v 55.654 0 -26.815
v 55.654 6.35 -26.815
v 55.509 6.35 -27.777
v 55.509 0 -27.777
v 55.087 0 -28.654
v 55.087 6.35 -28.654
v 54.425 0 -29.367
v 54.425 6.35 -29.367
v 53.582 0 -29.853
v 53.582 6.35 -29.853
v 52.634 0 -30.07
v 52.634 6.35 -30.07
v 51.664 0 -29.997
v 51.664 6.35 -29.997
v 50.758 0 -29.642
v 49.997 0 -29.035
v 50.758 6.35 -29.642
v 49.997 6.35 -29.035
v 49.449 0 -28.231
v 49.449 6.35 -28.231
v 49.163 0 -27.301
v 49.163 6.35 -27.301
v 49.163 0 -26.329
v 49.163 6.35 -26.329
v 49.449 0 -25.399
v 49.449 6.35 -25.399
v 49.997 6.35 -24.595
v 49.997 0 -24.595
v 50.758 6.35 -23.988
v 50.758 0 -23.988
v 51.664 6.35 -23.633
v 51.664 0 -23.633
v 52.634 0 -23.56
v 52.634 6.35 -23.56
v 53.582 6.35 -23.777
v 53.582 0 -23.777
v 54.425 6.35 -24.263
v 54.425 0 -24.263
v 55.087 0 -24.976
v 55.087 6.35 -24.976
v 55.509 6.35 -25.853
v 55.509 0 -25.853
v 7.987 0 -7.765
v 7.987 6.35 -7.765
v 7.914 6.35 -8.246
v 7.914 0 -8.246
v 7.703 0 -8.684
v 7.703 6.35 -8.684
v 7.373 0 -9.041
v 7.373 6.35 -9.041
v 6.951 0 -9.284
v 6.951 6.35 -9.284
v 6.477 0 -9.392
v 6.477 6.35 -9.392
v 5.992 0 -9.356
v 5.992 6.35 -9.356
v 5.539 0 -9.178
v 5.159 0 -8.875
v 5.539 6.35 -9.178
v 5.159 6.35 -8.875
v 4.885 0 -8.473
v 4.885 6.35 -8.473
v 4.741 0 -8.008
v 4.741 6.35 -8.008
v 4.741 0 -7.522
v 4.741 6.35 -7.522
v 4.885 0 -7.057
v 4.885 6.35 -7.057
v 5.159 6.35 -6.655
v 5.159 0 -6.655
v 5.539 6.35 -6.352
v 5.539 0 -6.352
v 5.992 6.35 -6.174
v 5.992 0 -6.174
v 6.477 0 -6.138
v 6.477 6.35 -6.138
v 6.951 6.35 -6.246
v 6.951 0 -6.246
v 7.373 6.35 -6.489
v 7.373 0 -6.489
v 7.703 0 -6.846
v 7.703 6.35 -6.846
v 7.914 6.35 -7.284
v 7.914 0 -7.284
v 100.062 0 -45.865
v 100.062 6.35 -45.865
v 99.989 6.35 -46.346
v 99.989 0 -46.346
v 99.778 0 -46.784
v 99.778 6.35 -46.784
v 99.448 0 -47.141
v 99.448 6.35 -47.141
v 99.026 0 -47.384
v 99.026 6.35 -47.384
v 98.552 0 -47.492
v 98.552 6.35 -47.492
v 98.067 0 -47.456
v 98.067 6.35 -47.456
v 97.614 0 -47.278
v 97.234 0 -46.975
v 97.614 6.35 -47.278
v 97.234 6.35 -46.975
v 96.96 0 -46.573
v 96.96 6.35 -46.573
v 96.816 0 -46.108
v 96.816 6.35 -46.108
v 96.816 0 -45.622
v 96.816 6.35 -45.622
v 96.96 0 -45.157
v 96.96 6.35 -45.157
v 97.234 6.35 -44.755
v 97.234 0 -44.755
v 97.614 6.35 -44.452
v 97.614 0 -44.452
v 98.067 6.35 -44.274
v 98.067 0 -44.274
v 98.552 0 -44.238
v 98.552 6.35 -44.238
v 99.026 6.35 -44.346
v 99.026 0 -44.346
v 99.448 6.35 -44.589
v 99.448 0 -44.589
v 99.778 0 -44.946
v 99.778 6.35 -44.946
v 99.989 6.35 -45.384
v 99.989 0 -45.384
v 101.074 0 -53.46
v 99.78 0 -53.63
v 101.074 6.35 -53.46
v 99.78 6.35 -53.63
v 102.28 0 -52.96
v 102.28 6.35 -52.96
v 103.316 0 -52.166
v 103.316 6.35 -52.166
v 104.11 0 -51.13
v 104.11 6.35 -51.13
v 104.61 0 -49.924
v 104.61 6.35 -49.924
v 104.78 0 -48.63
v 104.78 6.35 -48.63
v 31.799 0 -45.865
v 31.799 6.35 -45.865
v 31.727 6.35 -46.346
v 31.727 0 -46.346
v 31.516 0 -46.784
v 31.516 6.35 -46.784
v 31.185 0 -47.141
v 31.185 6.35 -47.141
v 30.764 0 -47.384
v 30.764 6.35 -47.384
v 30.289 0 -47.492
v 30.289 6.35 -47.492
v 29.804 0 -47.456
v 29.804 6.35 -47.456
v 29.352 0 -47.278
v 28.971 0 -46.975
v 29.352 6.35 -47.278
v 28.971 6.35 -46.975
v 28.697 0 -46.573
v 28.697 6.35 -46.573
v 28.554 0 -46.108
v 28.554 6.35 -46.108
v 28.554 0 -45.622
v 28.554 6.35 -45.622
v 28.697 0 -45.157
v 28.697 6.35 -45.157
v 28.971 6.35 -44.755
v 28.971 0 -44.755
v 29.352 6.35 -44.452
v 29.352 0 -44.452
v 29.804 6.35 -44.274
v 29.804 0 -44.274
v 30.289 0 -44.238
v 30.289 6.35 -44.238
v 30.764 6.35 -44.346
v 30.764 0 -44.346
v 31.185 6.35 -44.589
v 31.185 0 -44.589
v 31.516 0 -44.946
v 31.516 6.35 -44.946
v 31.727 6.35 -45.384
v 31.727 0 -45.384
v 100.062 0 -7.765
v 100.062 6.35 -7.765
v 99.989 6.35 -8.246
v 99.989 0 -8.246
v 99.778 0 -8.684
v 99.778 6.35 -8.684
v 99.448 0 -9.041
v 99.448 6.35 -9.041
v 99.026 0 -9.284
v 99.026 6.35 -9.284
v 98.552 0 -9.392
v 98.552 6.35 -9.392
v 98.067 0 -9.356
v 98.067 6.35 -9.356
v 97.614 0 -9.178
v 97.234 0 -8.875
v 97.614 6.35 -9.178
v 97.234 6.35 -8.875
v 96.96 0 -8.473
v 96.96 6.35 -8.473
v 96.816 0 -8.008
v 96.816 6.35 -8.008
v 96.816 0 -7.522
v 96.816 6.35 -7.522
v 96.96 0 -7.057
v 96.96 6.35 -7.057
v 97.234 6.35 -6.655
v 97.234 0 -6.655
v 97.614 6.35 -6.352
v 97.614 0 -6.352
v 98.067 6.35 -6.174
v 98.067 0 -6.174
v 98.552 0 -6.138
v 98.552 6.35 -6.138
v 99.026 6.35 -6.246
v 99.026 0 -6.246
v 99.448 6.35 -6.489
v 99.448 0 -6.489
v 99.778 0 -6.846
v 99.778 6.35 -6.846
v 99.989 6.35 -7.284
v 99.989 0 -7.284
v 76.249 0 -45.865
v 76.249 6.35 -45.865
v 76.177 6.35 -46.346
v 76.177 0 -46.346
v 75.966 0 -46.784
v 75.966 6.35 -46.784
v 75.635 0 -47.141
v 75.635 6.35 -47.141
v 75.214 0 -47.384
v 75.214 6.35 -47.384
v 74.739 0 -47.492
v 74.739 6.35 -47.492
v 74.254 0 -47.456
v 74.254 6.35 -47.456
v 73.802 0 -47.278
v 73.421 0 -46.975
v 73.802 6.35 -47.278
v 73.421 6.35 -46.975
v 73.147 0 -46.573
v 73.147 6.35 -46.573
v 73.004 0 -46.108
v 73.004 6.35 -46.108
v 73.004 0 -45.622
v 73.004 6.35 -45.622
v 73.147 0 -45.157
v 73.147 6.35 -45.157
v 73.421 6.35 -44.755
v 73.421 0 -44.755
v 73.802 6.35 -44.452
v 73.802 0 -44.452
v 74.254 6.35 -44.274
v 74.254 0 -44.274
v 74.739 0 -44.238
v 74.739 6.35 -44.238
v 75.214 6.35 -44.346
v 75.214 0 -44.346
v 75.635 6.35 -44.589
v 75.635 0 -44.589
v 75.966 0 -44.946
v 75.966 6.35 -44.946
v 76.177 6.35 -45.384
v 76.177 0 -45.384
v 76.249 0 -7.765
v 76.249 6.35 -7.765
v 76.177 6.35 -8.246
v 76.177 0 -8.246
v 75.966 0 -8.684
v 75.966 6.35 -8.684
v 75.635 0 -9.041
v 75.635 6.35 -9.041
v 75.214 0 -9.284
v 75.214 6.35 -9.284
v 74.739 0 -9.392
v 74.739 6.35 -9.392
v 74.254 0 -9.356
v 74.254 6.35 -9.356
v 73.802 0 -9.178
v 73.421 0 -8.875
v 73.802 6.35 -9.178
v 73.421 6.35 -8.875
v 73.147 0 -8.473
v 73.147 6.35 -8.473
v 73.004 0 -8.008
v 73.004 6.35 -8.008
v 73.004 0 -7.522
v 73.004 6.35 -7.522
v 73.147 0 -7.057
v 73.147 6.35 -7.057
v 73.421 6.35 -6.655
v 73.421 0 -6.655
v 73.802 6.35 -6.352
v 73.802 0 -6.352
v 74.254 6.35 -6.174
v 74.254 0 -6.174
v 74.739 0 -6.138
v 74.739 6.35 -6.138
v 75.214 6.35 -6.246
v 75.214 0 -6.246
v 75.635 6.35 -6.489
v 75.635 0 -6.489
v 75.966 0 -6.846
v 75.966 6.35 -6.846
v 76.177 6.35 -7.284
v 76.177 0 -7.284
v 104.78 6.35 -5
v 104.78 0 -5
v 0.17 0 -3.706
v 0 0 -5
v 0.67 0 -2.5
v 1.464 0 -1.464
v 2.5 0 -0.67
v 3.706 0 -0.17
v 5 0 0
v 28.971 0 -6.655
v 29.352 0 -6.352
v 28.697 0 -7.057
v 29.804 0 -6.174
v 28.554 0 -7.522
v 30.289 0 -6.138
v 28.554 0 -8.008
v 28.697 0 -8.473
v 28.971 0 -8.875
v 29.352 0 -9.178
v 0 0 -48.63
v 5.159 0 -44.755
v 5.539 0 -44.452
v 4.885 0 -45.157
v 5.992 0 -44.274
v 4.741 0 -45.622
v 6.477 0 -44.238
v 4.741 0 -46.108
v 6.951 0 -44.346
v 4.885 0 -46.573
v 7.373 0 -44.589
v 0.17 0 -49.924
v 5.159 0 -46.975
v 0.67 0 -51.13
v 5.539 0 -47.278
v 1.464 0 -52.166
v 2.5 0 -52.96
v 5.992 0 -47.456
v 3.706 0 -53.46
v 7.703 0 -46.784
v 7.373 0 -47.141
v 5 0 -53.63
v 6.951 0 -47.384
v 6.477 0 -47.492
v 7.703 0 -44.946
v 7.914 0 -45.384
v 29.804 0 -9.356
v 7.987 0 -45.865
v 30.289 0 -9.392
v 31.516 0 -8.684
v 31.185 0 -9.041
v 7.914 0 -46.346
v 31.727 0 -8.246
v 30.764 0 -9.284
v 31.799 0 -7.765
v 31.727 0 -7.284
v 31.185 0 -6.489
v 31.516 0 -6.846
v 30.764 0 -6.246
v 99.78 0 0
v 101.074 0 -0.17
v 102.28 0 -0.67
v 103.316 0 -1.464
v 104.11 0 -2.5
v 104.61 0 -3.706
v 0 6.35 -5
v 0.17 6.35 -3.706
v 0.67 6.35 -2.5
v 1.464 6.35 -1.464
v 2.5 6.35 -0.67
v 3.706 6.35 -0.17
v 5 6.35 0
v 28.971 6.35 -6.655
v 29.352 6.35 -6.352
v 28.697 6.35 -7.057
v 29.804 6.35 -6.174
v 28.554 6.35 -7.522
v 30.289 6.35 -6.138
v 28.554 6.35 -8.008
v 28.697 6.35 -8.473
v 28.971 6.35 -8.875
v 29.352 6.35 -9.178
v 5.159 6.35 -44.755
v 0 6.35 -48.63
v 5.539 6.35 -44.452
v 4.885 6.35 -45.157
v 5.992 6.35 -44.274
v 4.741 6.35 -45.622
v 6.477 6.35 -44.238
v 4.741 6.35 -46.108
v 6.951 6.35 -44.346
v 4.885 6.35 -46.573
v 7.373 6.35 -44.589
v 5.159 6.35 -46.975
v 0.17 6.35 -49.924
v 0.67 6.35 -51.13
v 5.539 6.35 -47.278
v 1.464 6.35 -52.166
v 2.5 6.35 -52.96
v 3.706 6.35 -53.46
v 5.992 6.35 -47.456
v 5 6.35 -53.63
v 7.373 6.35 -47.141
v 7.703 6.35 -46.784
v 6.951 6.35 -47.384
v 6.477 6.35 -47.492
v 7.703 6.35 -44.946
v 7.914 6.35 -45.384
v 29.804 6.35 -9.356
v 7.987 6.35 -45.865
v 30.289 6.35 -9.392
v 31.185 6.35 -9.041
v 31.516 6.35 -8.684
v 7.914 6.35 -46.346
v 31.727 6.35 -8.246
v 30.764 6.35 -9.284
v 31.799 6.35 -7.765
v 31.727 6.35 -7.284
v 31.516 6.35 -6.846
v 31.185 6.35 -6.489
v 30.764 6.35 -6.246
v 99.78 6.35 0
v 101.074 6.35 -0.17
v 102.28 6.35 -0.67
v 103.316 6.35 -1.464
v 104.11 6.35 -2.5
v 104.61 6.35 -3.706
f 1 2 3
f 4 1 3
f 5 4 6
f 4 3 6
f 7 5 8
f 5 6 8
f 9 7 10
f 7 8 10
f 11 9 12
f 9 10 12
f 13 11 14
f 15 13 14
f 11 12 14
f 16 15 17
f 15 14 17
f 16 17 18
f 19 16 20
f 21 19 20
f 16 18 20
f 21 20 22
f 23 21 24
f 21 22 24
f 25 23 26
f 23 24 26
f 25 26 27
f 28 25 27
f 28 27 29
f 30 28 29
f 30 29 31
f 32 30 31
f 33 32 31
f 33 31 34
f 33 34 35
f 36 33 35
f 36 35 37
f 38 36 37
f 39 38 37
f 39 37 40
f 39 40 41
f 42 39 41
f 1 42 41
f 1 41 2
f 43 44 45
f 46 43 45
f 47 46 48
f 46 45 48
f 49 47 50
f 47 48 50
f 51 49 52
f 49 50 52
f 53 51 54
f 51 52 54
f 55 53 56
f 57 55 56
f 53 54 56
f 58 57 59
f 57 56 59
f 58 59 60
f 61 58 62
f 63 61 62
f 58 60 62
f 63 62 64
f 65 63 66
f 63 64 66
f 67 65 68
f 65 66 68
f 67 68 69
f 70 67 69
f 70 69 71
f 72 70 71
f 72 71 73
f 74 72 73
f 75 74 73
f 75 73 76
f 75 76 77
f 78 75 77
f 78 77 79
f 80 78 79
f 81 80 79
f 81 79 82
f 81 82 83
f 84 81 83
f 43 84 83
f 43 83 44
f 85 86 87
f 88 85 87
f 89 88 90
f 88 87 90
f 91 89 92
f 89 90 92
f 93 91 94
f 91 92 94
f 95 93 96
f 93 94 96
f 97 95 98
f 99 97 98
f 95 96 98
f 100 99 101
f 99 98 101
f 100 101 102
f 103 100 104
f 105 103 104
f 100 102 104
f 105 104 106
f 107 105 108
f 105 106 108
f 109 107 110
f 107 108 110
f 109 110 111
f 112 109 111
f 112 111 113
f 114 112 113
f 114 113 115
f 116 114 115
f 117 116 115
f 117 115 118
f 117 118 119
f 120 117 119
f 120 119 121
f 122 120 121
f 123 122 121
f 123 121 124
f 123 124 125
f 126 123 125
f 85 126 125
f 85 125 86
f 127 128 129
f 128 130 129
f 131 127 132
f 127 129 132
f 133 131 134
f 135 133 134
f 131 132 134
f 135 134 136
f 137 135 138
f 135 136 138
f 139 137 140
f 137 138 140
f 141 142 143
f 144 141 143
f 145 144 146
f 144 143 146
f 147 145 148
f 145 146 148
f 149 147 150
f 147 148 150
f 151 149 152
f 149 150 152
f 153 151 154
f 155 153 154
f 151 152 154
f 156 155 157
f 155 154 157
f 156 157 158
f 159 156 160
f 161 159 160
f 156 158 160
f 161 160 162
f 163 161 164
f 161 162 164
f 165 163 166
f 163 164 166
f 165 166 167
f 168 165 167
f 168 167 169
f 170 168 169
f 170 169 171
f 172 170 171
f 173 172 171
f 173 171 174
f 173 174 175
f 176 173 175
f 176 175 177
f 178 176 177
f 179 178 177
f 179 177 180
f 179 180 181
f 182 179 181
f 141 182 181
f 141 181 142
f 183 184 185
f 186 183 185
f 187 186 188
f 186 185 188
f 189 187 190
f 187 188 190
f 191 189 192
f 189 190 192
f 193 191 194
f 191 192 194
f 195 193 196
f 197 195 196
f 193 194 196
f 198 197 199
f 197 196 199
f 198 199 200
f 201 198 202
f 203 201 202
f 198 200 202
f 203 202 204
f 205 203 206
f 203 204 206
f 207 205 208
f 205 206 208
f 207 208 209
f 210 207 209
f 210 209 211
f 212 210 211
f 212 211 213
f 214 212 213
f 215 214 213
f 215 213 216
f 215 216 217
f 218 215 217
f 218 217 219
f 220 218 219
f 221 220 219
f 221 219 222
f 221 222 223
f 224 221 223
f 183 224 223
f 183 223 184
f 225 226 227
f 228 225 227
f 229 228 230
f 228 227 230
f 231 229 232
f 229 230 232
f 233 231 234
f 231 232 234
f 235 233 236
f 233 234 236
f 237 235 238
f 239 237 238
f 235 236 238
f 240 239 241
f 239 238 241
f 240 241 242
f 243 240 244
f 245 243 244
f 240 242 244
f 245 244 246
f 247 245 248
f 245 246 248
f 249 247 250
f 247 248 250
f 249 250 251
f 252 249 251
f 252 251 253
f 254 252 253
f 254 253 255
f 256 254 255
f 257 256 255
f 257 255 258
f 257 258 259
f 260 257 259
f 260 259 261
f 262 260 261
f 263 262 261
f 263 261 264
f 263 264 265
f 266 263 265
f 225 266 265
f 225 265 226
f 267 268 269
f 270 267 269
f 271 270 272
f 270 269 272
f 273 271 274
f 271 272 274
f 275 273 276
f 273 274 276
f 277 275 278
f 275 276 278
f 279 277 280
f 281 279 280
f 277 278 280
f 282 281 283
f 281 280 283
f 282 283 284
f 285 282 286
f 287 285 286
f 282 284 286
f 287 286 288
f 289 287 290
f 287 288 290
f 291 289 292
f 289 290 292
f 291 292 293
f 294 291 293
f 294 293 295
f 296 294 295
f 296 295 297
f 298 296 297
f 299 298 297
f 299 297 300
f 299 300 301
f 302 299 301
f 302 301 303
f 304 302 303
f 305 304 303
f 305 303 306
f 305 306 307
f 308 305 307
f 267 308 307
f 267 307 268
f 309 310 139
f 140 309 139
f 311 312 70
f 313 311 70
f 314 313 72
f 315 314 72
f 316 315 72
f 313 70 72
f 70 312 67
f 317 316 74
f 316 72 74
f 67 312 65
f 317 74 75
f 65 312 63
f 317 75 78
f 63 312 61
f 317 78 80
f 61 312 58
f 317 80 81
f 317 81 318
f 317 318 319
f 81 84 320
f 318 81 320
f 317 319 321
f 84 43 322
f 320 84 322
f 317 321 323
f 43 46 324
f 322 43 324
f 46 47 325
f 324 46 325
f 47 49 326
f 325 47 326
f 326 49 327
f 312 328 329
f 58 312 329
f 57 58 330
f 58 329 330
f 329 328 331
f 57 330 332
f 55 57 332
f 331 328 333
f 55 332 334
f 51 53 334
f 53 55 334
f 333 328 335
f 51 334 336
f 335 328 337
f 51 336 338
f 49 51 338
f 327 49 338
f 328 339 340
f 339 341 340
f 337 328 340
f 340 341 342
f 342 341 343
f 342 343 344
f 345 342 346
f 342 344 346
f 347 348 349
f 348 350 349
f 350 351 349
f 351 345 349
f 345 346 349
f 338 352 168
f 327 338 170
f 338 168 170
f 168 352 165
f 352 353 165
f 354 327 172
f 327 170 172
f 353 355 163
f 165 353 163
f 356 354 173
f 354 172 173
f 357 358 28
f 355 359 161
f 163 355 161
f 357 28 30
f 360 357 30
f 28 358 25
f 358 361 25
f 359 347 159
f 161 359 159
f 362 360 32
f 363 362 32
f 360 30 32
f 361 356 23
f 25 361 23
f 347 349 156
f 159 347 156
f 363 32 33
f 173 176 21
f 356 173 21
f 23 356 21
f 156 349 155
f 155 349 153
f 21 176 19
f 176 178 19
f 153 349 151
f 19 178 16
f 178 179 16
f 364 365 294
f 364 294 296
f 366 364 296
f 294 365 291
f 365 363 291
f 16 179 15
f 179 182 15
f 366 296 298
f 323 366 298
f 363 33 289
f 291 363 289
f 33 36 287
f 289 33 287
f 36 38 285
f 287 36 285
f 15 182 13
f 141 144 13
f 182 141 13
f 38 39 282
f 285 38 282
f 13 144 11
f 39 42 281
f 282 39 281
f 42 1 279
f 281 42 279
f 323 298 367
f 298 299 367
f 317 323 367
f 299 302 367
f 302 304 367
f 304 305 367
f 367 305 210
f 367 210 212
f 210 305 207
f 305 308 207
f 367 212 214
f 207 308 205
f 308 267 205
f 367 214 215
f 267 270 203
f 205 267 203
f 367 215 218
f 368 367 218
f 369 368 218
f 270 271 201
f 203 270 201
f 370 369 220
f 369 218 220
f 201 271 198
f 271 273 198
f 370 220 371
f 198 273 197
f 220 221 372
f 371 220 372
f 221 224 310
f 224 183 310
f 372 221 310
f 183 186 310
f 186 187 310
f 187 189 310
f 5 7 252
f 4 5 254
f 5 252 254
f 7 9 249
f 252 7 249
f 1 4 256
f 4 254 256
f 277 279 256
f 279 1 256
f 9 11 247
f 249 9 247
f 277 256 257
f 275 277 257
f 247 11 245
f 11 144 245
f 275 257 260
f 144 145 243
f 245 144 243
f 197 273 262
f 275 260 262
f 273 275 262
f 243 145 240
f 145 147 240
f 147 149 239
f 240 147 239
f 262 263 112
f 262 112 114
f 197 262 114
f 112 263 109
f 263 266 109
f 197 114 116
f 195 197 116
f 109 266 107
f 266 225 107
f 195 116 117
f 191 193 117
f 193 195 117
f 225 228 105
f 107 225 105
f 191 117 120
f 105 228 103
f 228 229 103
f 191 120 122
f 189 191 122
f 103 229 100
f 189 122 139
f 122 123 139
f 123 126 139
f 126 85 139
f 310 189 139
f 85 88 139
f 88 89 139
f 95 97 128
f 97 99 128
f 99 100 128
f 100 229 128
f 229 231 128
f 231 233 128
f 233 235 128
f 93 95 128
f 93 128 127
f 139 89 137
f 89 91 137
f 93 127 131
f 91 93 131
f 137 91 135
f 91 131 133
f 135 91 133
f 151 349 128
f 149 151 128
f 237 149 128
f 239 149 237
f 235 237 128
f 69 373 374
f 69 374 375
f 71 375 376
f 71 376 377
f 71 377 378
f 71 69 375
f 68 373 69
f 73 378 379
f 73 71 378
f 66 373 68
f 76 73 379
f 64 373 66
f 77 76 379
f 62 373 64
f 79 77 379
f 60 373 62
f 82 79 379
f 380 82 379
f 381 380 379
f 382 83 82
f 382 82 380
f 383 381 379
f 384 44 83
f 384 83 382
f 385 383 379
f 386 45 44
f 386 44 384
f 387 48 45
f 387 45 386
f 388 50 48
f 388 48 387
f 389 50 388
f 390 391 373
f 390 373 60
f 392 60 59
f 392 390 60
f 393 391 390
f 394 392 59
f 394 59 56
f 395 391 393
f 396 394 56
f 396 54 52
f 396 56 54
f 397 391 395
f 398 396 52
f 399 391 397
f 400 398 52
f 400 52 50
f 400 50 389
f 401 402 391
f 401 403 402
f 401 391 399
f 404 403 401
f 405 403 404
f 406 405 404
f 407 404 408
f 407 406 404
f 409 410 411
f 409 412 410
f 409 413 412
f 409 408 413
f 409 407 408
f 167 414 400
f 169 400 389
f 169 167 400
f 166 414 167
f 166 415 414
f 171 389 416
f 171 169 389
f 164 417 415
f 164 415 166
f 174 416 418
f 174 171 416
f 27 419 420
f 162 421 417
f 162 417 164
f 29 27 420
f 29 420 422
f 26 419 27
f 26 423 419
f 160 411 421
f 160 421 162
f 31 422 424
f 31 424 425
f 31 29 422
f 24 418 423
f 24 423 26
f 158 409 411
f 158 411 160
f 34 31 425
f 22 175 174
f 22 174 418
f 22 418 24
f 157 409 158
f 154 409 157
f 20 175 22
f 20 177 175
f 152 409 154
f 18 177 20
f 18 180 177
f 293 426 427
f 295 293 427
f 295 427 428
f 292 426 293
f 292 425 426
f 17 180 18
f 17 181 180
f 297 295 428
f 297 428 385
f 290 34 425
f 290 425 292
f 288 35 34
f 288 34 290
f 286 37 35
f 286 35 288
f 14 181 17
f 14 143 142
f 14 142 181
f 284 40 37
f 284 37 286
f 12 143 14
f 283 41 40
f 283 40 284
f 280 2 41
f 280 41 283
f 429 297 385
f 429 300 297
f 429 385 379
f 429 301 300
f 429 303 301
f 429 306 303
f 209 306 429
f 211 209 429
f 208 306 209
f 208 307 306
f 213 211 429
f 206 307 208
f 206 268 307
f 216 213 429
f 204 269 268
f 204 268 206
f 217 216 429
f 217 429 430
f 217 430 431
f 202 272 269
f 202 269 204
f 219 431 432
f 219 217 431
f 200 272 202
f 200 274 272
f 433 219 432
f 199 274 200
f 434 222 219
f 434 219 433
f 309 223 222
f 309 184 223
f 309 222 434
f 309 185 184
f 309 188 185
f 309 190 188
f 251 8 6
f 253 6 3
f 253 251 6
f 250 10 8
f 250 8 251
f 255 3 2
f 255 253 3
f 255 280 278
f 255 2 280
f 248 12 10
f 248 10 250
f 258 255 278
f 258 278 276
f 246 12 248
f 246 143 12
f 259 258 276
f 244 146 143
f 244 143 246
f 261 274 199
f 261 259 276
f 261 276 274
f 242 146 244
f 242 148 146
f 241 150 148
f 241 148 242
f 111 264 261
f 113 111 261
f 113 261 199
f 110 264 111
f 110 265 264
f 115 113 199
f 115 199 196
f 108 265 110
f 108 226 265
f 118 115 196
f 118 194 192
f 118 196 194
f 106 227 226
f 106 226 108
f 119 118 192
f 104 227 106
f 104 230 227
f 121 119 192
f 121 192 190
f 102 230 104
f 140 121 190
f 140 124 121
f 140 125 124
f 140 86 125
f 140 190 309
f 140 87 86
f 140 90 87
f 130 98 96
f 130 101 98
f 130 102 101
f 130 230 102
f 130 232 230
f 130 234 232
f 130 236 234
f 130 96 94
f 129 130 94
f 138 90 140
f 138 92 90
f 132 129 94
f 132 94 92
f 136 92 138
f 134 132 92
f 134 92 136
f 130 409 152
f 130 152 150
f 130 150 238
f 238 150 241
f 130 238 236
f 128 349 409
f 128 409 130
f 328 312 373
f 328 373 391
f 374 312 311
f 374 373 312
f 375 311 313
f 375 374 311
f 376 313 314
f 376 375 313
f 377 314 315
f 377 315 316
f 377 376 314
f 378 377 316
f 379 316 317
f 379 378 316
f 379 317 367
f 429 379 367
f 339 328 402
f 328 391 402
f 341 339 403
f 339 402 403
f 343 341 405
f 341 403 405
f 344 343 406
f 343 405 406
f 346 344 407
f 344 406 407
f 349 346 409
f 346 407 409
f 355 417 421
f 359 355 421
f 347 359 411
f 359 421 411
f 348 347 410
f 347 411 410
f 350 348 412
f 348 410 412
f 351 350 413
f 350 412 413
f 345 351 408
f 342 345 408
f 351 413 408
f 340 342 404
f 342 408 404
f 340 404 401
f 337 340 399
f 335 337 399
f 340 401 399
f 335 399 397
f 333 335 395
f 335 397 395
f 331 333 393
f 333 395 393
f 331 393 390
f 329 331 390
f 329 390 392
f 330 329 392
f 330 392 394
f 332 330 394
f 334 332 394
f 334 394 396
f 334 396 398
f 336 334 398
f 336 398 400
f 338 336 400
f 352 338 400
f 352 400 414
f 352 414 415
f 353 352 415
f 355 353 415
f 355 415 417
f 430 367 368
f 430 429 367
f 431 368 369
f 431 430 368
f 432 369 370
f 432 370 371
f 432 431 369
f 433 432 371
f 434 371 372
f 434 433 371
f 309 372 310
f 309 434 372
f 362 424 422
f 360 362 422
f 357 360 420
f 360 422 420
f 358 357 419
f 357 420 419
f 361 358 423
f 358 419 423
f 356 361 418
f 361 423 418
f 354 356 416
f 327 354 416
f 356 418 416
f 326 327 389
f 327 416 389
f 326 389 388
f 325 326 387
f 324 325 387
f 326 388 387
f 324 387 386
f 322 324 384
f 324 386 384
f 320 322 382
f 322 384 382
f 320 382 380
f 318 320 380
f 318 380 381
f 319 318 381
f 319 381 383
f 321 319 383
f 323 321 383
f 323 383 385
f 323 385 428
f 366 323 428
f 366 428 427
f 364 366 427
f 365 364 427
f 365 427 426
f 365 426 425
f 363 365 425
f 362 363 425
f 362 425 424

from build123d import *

# Parameters (mm, degrees)
SKETCH1_W                    = 104.78
SKETCH1_H                    = 53.63
BOSS_EXTRUDE1_DEPTH          = 6.35
F_30_0_1285_DIAMETER_HOLE1_D = 3.2639
F_0_257_DIAMETER_HOLE1_D     = 6.5278
FILLET1_R                    = 5


with BuildPart() as part:
    # Sketch1 → Boss-Extrude1 (new body)
    with BuildSketch(Plane(origin=(0, 0, 0), x_dir=(1, 0, 0), z_dir=(0, 1, 0))):
        with Locations((52.39, 26.815)):
            Rectangle(SKETCH1_W, SKETCH1_H)
    extrude(amount=BOSS_EXTRUDE1_DEPTH)

    # #30 (0.1285) Diameter Hole1 (through all)
    with Locations(Plane(origin=(0, 0, 0), x_dir=(-1, 0, 0), z_dir=(0, -1, 0))):
        with Locations((-98.43, 7.765), (-98.43, 45.865), (-74.6175, 7.765), (-74.6175, 45.865), (-30.1675, 7.765), (-30.1675, 45.865), (-6.355, 7.765), (-6.355, 45.865)):
            Hole(F_30_0_1285_DIAMETER_HOLE1_D / 2)

    # F (0.257) Diameter Hole1 (through all)
    with Locations(Plane(origin=(0, 0, 0), x_dir=(-1, 0, 0), z_dir=(0, -1, 0))):
        with Locations((-52.39, 26.815)):
            Hole(F_0_257_DIAMETER_HOLE1_D / 2)

    # Fillet1
    fillet1_edges = [part.edges().sort_by_distance(p)[0] for p in [
        (0, 3.175, -53.63),
        (104.78, 3.175, -53.63),
        (104.78, 3.175, 0),
        (0, 3.175, 0),
    ]]
    fillet(fillet1_edges, radius=FILLET1_R)


solid = part.part
